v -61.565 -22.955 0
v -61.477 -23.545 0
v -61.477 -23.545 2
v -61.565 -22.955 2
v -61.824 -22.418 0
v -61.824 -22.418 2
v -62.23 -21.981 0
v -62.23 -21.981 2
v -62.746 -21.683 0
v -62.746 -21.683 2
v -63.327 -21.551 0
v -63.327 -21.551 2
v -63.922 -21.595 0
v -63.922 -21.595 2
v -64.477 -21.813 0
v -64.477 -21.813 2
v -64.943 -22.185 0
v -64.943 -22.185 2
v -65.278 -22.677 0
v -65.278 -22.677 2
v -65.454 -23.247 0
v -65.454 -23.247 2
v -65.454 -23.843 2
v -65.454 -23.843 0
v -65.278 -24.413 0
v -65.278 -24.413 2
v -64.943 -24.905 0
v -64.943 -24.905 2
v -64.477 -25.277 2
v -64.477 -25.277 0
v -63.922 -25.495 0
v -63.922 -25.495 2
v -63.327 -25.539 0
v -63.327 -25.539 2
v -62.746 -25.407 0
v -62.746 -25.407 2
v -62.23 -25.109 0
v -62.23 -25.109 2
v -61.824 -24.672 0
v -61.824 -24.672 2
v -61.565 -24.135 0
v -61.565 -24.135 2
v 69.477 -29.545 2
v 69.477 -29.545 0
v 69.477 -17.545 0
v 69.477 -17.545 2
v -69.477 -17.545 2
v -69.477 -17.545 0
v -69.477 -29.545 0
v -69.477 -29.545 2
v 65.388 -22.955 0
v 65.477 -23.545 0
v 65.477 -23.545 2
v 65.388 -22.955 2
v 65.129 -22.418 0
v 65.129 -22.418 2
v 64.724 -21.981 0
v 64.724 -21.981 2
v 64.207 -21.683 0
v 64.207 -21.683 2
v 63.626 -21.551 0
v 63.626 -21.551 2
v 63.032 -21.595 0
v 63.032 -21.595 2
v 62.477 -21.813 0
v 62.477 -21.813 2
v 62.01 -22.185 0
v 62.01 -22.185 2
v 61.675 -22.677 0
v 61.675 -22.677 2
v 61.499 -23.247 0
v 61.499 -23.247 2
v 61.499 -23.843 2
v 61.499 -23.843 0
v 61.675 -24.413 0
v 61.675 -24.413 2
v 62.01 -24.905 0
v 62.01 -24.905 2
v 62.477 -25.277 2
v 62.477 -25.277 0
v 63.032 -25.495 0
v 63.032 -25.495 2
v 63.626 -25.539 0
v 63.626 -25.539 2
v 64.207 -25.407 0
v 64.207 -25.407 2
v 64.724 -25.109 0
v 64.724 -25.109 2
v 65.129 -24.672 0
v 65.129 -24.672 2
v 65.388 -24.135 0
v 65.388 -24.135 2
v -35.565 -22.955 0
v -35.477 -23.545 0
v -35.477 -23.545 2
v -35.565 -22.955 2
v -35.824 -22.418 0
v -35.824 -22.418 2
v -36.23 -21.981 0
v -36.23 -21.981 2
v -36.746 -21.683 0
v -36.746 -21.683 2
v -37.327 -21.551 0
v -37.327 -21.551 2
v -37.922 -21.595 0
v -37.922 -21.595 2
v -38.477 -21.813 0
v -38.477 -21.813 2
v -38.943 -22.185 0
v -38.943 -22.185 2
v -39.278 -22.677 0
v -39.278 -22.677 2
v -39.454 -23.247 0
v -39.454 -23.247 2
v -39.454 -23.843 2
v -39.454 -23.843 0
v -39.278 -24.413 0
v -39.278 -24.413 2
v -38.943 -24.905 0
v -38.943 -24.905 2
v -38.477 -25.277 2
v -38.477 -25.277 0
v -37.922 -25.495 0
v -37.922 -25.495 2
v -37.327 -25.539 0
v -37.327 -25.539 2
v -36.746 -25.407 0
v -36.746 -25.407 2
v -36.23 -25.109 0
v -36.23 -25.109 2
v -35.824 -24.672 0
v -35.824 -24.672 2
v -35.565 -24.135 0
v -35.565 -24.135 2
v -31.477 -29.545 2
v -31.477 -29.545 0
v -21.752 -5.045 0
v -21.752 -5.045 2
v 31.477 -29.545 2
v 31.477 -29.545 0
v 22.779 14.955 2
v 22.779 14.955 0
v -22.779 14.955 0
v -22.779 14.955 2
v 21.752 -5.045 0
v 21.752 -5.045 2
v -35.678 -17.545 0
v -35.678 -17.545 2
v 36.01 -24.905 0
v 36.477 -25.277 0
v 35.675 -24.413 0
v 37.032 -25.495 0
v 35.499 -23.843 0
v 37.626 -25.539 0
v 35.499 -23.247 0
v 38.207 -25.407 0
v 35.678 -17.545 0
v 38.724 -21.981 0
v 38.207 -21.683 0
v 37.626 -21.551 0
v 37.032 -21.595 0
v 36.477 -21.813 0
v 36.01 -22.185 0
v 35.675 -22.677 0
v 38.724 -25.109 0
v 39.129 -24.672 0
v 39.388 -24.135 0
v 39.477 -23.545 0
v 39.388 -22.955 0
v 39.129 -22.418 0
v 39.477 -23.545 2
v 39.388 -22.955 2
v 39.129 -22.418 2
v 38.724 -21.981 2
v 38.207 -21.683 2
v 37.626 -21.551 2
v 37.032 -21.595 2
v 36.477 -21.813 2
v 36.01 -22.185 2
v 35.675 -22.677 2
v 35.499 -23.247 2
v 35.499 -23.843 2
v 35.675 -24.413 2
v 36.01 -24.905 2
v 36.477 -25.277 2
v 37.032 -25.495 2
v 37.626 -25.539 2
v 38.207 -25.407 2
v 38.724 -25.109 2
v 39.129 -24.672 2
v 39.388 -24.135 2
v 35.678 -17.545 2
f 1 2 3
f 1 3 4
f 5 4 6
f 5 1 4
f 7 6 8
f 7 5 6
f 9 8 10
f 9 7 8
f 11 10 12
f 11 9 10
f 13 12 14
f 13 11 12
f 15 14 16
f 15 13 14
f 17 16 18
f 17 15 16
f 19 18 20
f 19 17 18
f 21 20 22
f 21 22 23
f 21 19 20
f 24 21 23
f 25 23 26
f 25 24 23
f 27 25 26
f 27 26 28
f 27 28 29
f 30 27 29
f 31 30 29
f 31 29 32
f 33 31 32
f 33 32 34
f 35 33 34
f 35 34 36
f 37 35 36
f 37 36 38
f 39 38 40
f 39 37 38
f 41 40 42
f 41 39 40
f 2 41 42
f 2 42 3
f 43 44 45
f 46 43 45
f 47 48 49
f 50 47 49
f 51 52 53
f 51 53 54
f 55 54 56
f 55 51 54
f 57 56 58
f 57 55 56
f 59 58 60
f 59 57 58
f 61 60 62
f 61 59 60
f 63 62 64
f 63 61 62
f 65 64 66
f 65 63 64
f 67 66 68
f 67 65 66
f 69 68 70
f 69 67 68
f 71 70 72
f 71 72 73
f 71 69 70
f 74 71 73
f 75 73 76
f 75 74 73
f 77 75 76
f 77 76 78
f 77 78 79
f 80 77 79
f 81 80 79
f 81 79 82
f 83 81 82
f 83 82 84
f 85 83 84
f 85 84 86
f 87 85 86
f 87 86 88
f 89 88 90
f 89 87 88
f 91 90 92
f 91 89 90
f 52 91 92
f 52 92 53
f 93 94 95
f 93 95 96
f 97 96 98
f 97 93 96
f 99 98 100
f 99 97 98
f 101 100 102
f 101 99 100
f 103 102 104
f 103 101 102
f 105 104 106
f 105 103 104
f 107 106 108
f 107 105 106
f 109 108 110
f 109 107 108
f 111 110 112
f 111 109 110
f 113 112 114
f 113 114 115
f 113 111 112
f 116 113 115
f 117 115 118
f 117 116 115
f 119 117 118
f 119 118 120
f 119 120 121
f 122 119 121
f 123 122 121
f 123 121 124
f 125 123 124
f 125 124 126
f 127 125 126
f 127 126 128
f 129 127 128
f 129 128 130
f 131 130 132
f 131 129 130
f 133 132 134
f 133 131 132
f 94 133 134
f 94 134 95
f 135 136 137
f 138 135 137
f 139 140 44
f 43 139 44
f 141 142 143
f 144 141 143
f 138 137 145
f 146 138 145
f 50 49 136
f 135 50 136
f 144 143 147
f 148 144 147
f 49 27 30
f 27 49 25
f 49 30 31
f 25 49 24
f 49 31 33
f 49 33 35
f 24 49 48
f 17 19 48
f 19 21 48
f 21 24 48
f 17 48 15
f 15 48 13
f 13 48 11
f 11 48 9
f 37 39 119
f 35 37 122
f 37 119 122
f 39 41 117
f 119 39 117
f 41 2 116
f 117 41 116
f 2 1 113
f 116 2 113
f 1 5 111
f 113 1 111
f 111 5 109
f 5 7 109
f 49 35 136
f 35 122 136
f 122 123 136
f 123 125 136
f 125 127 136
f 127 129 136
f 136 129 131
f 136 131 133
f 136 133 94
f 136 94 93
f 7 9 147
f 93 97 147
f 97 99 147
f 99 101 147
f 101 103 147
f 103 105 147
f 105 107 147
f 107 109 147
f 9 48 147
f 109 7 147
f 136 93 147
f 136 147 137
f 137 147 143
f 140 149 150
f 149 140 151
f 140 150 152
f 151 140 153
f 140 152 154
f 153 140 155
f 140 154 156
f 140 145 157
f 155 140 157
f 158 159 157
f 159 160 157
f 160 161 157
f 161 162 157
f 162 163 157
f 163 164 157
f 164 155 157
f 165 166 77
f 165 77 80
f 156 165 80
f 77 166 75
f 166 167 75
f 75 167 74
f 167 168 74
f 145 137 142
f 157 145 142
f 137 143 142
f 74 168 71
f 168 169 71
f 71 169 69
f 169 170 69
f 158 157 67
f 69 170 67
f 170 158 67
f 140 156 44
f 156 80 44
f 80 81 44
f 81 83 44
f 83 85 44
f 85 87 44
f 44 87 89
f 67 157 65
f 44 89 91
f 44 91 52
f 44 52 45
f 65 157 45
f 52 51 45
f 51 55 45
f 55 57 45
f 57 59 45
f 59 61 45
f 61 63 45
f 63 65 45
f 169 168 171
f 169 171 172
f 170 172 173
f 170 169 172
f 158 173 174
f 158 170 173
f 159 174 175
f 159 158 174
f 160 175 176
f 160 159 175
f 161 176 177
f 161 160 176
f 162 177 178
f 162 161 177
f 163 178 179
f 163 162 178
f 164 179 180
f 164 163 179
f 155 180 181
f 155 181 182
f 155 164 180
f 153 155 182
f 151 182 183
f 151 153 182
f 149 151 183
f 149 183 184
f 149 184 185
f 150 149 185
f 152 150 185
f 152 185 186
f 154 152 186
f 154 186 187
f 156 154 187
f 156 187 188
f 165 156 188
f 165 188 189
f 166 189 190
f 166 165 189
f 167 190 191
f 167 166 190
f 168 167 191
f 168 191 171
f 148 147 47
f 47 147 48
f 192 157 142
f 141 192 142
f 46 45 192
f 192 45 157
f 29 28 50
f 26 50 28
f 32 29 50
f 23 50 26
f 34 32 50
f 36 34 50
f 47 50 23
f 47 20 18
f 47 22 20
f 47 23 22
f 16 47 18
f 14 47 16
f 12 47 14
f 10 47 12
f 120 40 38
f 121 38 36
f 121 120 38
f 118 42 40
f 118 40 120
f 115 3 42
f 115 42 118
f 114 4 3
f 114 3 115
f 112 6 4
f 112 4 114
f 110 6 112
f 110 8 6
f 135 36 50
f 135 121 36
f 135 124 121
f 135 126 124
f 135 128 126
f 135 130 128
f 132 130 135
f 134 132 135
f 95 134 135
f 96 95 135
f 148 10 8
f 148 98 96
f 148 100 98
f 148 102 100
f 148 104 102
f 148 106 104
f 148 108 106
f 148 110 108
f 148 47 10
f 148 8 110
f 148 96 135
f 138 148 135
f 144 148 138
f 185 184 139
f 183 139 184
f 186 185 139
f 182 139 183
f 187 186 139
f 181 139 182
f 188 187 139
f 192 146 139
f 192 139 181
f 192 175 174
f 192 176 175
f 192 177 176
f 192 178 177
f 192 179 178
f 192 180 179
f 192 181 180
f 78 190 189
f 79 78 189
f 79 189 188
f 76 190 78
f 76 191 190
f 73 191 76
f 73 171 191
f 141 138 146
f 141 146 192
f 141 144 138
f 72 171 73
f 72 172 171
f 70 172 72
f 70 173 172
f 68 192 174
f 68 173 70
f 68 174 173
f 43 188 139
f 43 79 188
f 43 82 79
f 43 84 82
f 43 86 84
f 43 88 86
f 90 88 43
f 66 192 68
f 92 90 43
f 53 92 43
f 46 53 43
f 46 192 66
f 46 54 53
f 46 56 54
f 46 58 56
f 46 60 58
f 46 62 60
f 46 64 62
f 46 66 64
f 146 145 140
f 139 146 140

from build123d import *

# Parameters (mm, degrees)
ESBO_O1_R                = 2
RESSALTO_EXTRUS_O2_DEPTH = 2


with BuildPart() as part:
    # Esboço1 → Ressalto-extrusão2 (new body)
    with BuildSketch(Plane.XY):
        Polygon((-0.066609968, -5.044992778), (0.066609968, -5.044992778), (21.752134594, -5.044992778), (31.476547475, -29.544992778), (69.476547475, -29.544992778), (69.476547475, -17.544992778), (35.678254574, -17.544992778), (22.778523201, 14.955007222), (-22.778523201, 14.955007222), (-35.678254574, -17.544992778), (-69.476547475, -17.544992778), (-69.476547475, -29.544992778), (-31.476547475, -29.544992778), (-21.752134594, -5.044992778), align=None)
        with Locations((-63.476547475, -23.544992778)):
            Circle(ESBO_O1_R, mode=Mode.SUBTRACT)
        with Locations((-37.476547475, -23.544992778)):
            Circle(ESBO_O1_R, mode=Mode.SUBTRACT)
        with Locations((37.476547475, -23.544992778)):
            Circle(ESBO_O1_R, mode=Mode.SUBTRACT)
        with Locations((63.476547475, -23.544992778)):
            Circle(ESBO_O1_R, mode=Mode.SUBTRACT)
    extrude(amount=RESSALTO_EXTRUS_O2_DEPTH)


solid = part.part
